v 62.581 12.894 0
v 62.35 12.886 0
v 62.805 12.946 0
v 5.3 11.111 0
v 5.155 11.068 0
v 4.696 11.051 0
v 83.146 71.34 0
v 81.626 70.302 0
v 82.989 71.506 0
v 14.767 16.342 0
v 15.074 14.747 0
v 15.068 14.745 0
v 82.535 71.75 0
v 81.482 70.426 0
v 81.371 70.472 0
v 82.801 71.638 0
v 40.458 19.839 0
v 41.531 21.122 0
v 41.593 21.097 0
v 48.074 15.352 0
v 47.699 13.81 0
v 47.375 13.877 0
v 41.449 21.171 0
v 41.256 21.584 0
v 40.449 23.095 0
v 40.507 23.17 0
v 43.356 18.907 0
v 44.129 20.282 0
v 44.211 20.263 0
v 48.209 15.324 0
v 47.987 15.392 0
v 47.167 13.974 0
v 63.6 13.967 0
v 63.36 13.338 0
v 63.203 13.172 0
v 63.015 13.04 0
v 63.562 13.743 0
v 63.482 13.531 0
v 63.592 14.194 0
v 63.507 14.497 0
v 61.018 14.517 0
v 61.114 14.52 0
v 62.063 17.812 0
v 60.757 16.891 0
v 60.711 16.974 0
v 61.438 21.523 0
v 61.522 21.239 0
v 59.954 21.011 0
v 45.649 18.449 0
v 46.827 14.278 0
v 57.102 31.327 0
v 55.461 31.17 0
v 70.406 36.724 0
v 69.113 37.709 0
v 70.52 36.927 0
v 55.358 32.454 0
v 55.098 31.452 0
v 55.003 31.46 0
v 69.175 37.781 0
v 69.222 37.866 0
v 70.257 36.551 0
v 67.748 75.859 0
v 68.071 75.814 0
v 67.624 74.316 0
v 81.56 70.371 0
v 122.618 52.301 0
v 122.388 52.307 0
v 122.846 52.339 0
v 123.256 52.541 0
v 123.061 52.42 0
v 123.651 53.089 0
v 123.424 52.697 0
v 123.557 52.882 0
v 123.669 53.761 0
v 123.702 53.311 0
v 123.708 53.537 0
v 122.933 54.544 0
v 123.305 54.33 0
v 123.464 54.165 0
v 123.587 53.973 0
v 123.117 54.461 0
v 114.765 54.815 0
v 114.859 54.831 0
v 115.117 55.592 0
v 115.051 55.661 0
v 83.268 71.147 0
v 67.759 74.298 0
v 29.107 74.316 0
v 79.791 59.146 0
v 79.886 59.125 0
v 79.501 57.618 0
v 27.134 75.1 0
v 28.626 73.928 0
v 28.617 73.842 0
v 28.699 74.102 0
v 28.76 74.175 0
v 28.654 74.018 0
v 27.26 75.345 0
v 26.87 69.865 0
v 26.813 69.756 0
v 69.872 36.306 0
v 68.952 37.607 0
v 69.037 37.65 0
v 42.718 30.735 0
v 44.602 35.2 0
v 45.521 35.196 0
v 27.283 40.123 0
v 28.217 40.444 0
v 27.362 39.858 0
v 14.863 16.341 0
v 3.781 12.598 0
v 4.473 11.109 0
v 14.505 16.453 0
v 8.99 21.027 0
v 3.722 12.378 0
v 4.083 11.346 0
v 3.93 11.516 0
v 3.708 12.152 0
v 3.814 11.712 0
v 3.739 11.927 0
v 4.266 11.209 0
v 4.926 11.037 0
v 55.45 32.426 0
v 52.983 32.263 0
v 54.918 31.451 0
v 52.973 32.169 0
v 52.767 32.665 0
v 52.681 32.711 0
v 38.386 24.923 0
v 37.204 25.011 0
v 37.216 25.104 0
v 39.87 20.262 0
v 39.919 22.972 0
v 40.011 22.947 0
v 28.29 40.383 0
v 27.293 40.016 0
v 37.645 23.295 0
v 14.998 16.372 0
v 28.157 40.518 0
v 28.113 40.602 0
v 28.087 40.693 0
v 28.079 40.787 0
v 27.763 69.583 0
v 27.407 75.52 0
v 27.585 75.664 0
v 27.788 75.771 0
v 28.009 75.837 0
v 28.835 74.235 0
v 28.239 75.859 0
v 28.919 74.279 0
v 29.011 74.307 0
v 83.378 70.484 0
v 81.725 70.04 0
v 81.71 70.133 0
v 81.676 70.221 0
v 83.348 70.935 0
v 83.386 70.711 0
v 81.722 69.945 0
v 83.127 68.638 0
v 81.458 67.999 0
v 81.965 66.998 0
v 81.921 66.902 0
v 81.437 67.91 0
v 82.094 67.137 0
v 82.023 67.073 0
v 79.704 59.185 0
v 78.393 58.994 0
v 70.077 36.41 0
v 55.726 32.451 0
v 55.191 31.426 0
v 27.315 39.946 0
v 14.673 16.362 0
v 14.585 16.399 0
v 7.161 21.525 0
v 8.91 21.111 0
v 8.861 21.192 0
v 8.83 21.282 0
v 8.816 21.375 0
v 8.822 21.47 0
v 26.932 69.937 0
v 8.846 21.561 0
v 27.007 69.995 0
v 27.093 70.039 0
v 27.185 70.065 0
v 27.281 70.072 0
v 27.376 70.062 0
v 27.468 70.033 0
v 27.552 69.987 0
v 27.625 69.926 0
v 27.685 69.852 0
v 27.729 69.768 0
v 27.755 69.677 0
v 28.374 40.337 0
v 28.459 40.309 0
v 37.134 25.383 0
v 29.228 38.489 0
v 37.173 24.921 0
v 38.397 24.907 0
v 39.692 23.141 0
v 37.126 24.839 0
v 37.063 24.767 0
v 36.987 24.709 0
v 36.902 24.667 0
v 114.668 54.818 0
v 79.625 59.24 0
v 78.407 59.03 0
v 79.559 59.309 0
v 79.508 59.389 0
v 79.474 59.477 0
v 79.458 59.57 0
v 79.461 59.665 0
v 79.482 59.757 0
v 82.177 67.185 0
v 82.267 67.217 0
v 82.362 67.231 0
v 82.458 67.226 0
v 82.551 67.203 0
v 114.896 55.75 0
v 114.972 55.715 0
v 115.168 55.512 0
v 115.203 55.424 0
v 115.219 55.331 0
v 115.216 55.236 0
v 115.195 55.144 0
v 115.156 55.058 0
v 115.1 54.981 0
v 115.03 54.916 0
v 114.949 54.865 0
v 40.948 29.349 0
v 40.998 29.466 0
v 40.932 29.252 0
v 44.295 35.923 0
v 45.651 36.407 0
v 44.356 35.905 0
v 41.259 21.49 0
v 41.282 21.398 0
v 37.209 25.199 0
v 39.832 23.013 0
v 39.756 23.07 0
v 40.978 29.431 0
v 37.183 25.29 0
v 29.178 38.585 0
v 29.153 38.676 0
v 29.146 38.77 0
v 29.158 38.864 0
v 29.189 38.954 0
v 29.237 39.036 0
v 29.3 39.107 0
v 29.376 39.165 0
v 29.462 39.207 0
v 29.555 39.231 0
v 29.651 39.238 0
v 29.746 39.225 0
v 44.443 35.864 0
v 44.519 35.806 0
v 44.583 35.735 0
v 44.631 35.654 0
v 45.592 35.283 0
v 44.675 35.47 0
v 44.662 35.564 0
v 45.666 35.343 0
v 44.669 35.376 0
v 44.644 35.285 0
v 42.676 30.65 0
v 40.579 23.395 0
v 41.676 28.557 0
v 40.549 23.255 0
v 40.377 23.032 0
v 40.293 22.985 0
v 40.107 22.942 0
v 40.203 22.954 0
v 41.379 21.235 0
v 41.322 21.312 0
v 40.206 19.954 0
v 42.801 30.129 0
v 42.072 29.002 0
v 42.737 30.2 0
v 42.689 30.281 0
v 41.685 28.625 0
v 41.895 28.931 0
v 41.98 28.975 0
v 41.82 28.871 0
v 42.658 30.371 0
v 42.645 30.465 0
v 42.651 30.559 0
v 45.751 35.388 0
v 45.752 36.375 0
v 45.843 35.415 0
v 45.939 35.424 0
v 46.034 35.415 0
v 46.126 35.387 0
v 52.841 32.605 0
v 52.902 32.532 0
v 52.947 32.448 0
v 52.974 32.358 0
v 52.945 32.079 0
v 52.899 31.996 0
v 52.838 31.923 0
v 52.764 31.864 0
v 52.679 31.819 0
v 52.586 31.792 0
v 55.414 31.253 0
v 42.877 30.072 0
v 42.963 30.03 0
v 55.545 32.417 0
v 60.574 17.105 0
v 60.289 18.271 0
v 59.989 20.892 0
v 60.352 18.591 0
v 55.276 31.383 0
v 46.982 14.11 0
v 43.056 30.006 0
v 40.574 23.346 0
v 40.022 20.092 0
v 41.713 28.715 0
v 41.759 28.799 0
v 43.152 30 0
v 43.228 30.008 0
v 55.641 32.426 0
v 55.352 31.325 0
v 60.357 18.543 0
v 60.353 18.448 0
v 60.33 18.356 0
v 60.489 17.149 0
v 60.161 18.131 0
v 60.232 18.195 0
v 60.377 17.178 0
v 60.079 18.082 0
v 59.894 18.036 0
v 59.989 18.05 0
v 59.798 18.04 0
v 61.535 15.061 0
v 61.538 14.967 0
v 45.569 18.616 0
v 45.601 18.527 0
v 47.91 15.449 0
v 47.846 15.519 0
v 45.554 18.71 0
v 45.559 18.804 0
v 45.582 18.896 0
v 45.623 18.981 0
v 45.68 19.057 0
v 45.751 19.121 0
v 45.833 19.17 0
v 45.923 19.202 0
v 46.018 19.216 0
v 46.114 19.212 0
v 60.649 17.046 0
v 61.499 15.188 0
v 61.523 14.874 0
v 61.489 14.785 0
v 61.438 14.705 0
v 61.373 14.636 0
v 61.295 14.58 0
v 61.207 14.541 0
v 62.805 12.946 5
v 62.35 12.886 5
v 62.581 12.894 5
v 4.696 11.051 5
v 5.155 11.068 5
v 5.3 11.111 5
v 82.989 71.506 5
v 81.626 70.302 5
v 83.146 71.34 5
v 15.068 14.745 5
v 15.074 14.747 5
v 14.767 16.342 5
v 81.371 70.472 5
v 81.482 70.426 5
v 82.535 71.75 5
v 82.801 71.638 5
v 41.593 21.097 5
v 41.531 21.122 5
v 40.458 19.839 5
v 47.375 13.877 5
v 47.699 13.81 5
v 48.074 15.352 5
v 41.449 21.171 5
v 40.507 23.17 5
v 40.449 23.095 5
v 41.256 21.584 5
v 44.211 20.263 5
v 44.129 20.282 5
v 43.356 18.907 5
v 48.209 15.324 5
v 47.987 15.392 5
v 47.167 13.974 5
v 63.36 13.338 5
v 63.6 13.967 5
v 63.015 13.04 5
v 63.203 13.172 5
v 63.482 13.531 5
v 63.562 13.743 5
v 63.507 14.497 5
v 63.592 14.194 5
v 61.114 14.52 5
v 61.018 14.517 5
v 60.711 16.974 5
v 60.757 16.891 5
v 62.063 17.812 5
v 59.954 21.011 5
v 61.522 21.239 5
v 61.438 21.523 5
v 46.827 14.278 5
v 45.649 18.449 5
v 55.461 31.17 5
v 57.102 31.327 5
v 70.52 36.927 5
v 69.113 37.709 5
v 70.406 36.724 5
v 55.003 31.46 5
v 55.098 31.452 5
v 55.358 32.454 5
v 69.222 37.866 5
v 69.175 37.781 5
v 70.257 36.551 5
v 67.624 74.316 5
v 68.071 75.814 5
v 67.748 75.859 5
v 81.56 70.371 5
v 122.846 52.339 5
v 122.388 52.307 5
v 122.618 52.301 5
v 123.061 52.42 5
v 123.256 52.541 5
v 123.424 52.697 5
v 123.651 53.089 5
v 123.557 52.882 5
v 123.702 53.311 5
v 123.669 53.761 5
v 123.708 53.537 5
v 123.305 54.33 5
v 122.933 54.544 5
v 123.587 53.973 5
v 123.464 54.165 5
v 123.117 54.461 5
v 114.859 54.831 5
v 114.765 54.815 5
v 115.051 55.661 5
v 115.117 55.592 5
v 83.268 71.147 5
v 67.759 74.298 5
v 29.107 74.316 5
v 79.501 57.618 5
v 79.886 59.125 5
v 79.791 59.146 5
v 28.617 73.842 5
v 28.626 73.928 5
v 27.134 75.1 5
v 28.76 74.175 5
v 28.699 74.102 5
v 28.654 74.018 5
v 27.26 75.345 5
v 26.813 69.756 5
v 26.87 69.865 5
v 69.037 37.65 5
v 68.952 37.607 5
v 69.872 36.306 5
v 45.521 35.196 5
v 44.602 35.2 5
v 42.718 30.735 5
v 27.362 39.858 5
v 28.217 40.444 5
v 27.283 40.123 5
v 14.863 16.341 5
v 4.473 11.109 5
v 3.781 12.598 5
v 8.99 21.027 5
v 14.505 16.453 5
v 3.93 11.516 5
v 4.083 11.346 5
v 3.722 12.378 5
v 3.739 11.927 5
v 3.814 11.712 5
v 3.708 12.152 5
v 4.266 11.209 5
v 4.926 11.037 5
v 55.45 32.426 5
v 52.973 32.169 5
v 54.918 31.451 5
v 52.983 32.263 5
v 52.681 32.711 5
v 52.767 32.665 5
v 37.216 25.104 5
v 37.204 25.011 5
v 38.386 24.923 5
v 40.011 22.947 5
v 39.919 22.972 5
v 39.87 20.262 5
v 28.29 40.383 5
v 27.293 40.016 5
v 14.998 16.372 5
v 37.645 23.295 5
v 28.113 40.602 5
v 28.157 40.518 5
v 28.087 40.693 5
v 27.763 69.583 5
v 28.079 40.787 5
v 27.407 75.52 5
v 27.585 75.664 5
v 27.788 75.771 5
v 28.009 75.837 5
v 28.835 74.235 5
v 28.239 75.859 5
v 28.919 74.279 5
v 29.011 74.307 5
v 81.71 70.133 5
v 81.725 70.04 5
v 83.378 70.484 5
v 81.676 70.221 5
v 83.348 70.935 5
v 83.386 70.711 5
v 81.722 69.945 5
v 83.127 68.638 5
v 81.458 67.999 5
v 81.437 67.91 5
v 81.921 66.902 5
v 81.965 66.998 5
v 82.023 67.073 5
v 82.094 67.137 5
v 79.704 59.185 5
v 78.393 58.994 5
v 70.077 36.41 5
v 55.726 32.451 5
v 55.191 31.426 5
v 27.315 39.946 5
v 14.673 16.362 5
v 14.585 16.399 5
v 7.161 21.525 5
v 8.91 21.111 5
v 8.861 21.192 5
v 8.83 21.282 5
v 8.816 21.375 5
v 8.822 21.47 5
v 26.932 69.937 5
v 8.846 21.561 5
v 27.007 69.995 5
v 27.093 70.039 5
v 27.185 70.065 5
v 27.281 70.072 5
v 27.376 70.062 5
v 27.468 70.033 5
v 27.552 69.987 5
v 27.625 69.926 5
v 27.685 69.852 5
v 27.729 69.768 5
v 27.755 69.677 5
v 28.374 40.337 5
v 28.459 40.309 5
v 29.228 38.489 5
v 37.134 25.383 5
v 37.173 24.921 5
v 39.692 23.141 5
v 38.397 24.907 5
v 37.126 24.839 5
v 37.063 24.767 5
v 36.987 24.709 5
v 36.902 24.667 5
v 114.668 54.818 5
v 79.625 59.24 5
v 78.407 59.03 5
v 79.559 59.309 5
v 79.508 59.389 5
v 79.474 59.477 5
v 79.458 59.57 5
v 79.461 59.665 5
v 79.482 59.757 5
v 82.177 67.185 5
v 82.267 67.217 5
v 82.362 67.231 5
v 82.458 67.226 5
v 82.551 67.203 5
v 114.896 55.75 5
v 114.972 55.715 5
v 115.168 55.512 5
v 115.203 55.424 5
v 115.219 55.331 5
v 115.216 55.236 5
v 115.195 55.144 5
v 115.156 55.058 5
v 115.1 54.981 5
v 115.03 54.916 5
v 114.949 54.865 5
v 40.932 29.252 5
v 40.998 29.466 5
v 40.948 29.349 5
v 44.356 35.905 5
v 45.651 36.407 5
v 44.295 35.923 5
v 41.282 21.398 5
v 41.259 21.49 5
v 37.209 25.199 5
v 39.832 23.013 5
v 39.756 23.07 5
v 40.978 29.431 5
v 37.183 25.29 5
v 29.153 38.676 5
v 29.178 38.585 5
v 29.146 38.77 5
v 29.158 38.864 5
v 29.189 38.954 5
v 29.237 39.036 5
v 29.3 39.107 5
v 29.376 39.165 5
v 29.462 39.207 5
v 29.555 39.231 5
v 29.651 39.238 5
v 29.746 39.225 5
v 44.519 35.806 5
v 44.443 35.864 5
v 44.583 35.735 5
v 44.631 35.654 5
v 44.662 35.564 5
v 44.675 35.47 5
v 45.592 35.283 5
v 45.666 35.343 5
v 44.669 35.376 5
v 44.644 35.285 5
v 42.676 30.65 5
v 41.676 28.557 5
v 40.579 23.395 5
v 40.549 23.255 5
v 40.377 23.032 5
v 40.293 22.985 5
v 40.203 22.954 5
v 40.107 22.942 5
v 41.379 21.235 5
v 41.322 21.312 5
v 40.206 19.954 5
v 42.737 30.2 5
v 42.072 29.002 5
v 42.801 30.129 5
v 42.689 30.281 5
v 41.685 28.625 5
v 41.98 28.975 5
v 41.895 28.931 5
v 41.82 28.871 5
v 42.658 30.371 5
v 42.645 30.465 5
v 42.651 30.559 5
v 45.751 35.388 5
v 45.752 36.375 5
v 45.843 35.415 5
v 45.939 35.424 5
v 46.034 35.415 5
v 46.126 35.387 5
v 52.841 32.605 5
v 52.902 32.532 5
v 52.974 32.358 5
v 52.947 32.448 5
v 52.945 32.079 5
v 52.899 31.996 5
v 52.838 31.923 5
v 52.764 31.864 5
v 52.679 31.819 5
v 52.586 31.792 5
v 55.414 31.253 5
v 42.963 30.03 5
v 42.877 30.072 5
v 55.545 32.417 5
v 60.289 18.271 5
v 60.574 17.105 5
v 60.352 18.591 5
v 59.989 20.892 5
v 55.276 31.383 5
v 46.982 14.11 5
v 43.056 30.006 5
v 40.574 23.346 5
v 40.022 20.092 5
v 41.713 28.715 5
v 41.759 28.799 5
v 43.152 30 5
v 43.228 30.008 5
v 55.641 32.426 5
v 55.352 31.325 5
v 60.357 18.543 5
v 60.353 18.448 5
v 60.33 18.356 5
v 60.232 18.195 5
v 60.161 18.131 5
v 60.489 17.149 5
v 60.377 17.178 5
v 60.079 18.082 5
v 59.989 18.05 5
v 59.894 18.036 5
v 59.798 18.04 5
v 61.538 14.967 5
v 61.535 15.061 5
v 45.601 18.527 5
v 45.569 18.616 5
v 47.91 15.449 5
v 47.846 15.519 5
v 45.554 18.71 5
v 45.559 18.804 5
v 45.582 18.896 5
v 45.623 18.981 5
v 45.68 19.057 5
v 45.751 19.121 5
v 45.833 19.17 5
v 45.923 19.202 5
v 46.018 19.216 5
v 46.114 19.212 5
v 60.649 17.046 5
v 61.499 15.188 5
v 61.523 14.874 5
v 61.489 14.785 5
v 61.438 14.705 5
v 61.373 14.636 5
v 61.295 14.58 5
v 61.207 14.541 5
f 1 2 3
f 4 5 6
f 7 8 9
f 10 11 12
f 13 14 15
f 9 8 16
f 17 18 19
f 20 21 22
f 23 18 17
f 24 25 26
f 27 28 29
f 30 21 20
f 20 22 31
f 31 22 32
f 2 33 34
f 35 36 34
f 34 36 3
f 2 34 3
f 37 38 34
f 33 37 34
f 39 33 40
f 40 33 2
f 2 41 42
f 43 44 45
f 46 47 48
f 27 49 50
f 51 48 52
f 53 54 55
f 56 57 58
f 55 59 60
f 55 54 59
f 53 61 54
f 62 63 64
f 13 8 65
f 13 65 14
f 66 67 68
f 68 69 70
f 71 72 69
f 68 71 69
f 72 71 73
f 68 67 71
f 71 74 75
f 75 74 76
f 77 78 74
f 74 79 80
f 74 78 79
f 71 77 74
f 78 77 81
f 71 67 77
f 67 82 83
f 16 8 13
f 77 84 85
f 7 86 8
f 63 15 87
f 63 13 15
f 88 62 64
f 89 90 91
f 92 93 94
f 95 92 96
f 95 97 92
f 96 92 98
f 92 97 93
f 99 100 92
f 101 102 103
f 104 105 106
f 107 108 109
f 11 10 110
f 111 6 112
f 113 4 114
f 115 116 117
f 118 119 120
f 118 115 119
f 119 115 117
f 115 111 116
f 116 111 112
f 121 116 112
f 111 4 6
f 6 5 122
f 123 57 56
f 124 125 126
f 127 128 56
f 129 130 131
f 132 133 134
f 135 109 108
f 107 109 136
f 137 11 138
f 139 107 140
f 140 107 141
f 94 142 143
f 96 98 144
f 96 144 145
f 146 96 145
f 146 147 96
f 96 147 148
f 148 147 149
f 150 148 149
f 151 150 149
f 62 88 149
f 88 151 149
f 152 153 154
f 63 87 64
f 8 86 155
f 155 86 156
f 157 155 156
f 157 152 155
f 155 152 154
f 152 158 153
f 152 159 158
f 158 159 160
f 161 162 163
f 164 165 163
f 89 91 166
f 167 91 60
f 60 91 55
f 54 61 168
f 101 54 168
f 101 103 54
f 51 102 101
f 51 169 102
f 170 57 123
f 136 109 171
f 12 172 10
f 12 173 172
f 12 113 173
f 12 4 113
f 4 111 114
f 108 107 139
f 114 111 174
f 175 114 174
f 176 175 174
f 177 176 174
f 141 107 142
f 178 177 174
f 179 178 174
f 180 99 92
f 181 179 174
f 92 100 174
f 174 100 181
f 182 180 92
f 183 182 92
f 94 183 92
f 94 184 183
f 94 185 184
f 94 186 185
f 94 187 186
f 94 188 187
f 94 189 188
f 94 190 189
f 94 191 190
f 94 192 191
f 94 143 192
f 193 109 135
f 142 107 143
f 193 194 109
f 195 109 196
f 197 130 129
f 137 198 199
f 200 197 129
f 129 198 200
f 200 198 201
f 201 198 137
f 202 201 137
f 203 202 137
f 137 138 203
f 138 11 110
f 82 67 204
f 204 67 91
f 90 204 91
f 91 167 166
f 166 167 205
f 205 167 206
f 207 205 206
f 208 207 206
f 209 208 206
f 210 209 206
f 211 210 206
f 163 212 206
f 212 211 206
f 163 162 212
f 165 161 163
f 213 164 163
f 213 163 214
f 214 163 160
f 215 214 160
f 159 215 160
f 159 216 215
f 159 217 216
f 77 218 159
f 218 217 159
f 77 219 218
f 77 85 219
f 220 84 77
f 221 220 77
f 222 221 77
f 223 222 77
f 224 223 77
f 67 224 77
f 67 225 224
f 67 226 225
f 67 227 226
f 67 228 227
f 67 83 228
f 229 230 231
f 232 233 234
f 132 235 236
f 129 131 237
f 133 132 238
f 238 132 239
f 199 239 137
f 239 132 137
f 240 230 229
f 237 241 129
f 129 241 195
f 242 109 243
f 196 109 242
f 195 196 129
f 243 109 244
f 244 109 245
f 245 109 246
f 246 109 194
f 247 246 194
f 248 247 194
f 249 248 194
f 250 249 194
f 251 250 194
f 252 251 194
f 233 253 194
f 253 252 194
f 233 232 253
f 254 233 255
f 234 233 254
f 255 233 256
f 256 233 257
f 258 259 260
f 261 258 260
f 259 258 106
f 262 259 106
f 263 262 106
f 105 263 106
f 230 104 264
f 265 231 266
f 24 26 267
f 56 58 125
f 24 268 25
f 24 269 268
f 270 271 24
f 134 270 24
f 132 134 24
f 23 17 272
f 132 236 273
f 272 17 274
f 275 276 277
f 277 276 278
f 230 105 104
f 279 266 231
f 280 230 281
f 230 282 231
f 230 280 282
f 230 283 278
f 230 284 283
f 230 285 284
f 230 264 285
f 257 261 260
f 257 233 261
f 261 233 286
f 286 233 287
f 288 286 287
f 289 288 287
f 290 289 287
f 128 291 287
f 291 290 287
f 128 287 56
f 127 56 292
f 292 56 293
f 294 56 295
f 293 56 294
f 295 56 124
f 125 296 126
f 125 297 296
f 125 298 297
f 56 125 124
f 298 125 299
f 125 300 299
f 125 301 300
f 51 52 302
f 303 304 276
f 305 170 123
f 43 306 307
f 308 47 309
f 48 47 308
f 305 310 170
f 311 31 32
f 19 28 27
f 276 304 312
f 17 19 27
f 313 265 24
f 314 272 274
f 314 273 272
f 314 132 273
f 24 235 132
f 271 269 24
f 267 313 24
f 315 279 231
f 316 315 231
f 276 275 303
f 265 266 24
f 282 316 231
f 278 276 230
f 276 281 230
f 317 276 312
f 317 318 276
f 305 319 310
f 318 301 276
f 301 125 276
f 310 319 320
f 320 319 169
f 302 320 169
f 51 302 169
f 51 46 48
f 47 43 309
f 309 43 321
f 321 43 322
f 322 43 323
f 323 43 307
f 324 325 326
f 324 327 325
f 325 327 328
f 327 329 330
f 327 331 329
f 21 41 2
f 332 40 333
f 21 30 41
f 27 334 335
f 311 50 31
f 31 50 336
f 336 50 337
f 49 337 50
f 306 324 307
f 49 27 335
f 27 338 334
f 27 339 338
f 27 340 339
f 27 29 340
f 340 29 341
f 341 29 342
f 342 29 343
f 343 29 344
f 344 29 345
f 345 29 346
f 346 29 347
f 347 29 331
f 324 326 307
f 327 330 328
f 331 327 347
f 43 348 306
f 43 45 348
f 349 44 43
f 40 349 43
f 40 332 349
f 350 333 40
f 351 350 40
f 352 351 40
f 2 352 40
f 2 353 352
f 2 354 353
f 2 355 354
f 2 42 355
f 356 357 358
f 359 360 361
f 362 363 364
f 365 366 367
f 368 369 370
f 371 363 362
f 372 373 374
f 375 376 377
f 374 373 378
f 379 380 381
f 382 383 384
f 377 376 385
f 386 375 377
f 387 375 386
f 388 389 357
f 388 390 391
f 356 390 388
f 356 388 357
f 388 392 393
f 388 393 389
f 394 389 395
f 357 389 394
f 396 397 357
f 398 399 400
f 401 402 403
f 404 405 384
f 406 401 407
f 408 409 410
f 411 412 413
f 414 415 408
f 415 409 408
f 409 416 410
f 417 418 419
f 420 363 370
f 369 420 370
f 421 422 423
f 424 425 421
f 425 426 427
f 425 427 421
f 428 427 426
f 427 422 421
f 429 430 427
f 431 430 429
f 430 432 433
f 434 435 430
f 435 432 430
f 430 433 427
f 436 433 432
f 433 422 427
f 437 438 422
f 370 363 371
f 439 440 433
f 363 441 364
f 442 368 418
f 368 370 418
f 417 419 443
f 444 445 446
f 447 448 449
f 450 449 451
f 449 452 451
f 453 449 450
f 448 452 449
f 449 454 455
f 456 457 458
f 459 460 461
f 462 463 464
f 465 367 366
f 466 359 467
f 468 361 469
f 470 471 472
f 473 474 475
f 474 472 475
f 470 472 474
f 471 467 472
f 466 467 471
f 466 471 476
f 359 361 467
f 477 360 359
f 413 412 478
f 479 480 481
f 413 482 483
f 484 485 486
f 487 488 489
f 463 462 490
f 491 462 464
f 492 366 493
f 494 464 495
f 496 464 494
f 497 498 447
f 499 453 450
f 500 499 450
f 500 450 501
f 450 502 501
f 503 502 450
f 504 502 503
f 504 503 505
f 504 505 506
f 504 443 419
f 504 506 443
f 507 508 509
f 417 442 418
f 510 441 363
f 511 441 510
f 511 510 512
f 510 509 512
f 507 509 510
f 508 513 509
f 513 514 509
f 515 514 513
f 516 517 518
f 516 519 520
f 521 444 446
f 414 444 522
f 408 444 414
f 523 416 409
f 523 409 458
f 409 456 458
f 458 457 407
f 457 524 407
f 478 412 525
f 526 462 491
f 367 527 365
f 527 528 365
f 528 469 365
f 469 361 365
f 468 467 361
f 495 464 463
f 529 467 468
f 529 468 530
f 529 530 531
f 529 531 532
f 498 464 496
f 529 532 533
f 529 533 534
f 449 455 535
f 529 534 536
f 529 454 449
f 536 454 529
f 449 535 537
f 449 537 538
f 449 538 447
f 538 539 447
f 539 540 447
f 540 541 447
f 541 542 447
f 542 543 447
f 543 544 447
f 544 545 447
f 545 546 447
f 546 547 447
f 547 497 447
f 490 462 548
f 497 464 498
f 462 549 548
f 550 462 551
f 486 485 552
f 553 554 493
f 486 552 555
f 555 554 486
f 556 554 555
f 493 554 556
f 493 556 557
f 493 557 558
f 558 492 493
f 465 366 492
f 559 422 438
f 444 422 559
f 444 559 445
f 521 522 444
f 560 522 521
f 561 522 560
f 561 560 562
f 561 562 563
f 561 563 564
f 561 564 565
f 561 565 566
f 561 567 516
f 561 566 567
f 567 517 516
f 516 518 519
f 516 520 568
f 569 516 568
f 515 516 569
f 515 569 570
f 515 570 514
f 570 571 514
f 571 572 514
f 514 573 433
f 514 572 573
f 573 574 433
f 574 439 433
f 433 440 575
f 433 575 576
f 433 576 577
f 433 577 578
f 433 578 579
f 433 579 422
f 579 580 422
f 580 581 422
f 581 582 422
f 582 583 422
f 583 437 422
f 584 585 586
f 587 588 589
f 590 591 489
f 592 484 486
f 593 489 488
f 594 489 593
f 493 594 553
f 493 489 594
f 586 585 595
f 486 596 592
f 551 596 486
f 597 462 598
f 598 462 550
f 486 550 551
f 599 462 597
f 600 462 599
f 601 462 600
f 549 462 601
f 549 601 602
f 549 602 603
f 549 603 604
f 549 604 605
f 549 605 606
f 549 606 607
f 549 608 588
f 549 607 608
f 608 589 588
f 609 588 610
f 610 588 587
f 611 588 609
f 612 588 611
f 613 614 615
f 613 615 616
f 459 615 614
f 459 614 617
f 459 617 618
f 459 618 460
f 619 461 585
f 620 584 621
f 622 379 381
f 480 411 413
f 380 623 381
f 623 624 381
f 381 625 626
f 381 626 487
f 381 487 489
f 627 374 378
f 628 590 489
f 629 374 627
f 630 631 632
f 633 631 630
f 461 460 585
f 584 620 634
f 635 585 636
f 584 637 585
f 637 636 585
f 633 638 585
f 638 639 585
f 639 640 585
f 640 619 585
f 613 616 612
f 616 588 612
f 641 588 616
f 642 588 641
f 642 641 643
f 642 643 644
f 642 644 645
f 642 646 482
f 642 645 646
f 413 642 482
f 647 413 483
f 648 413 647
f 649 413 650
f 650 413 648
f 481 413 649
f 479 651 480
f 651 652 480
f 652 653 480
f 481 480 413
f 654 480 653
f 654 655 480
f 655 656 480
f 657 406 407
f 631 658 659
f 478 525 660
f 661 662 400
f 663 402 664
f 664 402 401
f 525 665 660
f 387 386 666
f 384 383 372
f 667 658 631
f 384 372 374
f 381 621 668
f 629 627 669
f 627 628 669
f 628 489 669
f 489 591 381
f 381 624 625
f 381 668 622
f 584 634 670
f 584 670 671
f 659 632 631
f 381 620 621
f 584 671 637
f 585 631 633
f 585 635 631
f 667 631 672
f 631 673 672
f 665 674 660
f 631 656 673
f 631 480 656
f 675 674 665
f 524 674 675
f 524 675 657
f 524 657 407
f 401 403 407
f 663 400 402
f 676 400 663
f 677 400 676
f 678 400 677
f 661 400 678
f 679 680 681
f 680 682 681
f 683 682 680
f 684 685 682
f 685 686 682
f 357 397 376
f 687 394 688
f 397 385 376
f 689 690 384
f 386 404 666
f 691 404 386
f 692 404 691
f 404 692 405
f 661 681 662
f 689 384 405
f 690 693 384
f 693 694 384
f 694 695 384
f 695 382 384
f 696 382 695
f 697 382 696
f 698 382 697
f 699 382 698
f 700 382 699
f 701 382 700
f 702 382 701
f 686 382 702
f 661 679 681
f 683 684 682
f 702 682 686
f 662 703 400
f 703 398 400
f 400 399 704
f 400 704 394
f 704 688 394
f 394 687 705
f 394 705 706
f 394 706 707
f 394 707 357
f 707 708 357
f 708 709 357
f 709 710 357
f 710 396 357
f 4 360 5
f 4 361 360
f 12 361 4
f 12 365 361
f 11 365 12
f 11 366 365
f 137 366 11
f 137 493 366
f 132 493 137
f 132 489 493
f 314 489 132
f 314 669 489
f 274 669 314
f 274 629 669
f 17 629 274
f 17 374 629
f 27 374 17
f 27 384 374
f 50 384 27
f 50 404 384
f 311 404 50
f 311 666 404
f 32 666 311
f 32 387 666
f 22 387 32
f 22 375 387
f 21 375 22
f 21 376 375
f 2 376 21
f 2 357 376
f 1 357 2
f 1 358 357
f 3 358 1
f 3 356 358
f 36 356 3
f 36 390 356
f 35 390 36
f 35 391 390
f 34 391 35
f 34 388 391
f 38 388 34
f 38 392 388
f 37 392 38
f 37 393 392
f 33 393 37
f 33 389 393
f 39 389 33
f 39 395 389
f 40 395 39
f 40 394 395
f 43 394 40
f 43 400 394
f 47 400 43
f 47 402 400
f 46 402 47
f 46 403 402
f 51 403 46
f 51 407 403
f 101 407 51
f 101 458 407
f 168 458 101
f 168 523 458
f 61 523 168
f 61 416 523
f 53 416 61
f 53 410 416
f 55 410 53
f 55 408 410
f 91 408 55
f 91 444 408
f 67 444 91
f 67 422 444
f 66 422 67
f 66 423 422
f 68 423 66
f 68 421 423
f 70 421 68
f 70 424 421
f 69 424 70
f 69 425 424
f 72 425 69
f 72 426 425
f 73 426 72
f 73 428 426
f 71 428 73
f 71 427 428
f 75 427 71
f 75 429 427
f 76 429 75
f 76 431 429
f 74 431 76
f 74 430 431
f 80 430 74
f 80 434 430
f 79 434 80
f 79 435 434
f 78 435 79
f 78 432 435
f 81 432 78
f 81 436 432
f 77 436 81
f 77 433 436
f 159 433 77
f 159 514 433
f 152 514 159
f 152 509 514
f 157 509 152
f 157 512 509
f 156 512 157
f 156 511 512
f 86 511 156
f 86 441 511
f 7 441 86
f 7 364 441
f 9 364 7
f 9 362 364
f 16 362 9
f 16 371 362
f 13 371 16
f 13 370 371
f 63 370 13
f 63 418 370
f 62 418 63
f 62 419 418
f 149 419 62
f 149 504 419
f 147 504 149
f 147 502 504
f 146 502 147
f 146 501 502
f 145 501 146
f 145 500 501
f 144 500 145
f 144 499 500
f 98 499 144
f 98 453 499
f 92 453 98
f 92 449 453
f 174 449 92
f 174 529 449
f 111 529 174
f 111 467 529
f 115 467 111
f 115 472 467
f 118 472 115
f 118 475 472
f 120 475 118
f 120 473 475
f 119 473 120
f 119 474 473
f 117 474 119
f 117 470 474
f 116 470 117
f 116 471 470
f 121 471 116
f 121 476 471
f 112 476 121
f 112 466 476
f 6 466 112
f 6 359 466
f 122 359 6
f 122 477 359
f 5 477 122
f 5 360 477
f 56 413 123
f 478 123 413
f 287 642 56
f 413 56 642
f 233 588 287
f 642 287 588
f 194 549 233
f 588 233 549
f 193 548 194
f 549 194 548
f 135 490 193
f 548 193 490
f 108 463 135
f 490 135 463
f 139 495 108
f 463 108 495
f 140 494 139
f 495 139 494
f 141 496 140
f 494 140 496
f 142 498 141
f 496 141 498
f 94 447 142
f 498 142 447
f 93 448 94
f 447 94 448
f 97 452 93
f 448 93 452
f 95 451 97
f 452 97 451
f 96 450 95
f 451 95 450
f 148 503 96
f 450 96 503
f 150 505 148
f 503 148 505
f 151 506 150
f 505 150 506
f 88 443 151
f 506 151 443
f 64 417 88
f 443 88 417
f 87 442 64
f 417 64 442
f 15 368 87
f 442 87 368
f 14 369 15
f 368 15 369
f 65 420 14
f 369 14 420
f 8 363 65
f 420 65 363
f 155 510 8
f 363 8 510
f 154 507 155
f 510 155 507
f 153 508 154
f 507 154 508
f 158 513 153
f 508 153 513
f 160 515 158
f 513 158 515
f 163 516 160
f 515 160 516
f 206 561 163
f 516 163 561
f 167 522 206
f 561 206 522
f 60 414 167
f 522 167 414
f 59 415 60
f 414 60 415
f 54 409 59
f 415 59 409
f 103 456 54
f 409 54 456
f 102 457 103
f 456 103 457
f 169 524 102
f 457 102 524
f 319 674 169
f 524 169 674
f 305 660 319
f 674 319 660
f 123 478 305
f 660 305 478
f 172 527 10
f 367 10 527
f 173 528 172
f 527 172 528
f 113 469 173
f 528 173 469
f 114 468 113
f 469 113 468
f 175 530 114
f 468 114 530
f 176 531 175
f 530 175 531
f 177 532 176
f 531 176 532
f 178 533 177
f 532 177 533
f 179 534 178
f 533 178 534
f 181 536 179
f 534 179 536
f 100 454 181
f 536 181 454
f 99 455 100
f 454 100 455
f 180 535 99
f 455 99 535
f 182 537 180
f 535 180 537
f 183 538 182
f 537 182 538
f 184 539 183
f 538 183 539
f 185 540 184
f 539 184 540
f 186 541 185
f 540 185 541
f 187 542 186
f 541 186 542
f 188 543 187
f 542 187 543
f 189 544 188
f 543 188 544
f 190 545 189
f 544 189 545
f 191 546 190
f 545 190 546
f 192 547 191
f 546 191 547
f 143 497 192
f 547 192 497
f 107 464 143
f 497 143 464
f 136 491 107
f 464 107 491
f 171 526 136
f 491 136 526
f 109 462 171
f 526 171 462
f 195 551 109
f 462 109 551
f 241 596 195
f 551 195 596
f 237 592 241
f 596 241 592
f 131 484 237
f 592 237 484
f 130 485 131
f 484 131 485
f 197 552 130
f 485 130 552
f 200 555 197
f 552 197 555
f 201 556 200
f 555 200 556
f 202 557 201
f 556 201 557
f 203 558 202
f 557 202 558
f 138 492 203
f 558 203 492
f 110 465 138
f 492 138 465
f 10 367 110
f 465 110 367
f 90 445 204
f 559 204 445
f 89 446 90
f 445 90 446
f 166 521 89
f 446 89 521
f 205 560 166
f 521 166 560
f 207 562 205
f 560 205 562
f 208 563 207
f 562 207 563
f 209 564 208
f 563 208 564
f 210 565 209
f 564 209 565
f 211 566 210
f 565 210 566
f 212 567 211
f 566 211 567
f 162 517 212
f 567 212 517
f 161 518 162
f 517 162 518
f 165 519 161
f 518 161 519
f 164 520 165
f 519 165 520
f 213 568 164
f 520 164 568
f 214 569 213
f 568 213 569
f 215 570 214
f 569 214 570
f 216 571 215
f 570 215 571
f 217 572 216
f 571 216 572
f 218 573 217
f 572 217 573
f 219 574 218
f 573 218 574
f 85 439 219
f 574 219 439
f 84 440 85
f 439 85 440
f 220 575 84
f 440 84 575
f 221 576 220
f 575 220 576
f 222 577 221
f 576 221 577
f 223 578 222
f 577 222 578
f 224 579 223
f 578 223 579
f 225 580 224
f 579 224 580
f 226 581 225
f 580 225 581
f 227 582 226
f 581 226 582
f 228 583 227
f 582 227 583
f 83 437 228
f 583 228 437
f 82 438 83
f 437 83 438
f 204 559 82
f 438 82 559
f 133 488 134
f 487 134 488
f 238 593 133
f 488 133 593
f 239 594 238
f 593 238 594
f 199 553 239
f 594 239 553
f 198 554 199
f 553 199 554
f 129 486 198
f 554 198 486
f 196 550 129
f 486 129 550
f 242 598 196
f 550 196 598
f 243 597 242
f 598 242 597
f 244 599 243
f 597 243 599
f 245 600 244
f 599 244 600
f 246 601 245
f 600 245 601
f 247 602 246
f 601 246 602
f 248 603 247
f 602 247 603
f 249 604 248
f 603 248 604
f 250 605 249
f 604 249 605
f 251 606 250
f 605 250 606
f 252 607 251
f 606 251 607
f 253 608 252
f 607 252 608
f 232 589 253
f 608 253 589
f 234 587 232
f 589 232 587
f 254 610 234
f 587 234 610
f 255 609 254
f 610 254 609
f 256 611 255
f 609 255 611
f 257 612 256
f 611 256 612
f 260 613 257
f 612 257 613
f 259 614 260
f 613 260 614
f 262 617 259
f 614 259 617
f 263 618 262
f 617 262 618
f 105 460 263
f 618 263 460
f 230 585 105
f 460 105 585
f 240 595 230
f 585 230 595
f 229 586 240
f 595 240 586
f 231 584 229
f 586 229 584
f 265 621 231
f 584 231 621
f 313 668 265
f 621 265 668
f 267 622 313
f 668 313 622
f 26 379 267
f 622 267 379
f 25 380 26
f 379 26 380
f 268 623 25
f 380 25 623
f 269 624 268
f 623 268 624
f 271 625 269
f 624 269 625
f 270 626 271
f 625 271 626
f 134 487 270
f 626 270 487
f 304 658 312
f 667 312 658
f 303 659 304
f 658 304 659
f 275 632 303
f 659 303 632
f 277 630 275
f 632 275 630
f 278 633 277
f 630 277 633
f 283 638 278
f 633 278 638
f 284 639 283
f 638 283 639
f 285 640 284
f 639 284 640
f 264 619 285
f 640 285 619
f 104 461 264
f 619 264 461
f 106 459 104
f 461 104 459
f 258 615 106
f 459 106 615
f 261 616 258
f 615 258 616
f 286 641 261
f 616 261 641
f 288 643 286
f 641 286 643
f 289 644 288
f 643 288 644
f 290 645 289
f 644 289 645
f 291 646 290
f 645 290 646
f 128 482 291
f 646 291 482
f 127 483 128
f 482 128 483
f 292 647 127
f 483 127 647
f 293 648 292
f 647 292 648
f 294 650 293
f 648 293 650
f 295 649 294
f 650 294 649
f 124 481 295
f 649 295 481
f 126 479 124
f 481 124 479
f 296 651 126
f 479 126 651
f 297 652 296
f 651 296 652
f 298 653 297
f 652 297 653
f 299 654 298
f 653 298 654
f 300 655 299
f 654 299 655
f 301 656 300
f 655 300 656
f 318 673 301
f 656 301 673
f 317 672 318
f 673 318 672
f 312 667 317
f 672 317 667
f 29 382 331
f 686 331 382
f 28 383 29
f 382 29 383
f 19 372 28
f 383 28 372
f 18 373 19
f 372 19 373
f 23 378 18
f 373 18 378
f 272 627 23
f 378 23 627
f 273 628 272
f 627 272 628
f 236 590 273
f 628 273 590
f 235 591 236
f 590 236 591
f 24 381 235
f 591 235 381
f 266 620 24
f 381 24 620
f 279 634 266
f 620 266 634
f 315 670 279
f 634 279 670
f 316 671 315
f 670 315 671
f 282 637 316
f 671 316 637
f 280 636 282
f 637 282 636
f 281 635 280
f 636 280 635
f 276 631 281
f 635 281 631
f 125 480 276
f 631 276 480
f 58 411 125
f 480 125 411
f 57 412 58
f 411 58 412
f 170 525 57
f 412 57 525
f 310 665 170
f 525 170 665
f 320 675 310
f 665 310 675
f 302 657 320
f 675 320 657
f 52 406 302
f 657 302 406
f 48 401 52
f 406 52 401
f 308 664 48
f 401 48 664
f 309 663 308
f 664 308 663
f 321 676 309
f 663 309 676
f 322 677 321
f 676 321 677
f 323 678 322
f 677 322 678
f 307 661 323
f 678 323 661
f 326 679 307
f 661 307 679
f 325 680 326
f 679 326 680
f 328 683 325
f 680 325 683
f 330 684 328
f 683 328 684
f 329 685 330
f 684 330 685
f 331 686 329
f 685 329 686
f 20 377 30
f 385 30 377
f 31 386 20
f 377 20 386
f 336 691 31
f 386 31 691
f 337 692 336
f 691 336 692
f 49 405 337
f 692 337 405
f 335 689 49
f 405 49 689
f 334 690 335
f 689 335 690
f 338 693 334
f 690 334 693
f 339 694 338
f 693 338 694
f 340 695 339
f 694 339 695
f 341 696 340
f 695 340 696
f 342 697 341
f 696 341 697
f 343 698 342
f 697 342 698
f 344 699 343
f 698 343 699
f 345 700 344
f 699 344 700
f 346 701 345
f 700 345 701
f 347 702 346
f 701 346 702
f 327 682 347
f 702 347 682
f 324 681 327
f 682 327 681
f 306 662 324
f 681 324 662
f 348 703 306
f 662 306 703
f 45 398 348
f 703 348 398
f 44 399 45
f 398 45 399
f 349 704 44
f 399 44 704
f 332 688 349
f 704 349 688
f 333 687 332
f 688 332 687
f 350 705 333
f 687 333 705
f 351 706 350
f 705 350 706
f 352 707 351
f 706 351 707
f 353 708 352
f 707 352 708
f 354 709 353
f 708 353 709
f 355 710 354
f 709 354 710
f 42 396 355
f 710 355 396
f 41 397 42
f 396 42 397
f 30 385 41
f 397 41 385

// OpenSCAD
/*
 * Customizable Origami - Mouse - https://www.thingiverse.com/thing:2742618
 * by Dennis Hofmann - https://www.thingiverse.com/mightynozzle/about
 * created 2018-01-02
 * version v1.0
 *
 * Changelog
 * --------------
 * v1.0:
 *      - final design
 * --------------
 * 
 * This work is licensed under the Creative Commons - Attribution - NonCommercial - ShareAlike license.
 * https://creativecommons.org/licenses/by-nc-sa/3.0/
 */


 // Parameter Section //
//-------------------//

// preview[view:north, tilt:top]

// The maximum size of the longest side. The shorter side will be automatically resized in same ratio.
max_size_in_millimeter = 120; //[20:300]

// The height of the model.
model_height_in_millimeter = 5; //[0.2:0.2:100]

// Thickness of the outer outline.
outline_size_in_millimeter = 1.6; //[0.5:0.1:20]

// Thickness of the inner outline.
inline_size_in_millimeter = 0.8; //[0.5:0.1:20]

// Roundiness of the ends of the inner outlines.
inline_edge_radius_in_millimeter = 0.5; //[0.0:0.1:5]

// Flip model
flip_model = "no"; //[yes,no]

/*[hidden]*/
max_size = max_size_in_millimeter;
model_height = model_height_in_millimeter;
$fn=32;

// Outer Points
A1 = [78, 198];
A2 = [234, 257];
A3 = [608, 401];
A4 = [652, 340];
A5 = [704, 323];
A6 = [763, 243];
A7 = [997, 228];
A8 = [973, 284];
A9 = [964, 342];
A10 = [887, 519];
A11 = [1109, 607];
A12 = [1258, 956];
A13 = [1957, 868];
A14 = [1307, 1102];
A15 = [1313, 1147];
A16 = [1082, 1213];
A17 = [451, 1213];
A18 = [132, 343];

outline = [A1, A2, A3, A4, A5, A6, A7, A8, A9, A10, A11, A12, A13, A14, A15, A16, A17, A18];

// Inner Points
B1 = [442, 651];
B2 = [728, 585];
B3 = [660, 475];

// Polygons
C1 = [A6, A7, A8, A5];
C2 = [A4, A5, A8, A9, A10, B3];
C3 = [A4, A3, B1, B2, B3];
C4 = [B2, A10, B3];
C5 = [A2, A18, A17, B1, A3];
C6 = [B1, A17, A16, A15, A14, A12, A11, A10, B2];
C7 = [A12, A13, A14];

cut_polygons = [C1, C2, C3, C4, C5, C6, C7];

min_x = A1[0];
min_y = A1[1];
max_x = A13[0];
max_y = A17[1];

x_size = max_x - min_x;
y_size = max_y - min_y;

x_factor = max_size / x_size;
y_factor = max_size / y_size;

inline_size = x_size > y_size ? inline_size_in_millimeter / x_factor / 2: inline_size_in_millimeter / y_factor / 2;
inline_edge_radius = x_size > y_size ? inline_edge_radius_in_millimeter / x_factor: inline_edge_radius_in_millimeter / y_factor;
outline_size = x_size > y_size ? outline_size_in_millimeter / x_factor - inline_size: outline_size_in_millimeter / y_factor - inline_size;


 // Program Section //
//-----------------//

if(x_size > y_size) {
    resize(newsize=[max_size, x_factor * y_size, model_height]){
        if(flip_model == "yes") {
            mirror([0,1,0]) {
                rotate([180,180,0]) {    
                    create(outline, cut_polygons);
                }
            }
        } else {
            create(outline, cut_polygons);
        }
    }
} else {
    resize(newsize=[y_factor * x_size, max_size, model_height]){
        if(flip_model == "yes") {
            mirror([0,1,0]) {
                rotate([180,180,0]) {    
                    create(outline, cut_polygons);
                }
            }
        } else {
            create(outline, cut_polygons);
        }
    }
}


 // Module Section //
//----------------//

module create() {
    linear_extrude(height=1) {
        difference() {
            offset(r = -0) {
                offset(r = +outline_size) {
                    polygon(points = outline, convexity = 10);
                }
            }
            
            for(cut_polygon = [0:len(cut_polygons)]) {
                offset(r = +inline_edge_radius) {
                    offset(r = -inline_size - inline_edge_radius) {
                        polygon(points = cut_polygons[cut_polygon], convexity = 10);
                    }
                }
            }
        }
    }
}
